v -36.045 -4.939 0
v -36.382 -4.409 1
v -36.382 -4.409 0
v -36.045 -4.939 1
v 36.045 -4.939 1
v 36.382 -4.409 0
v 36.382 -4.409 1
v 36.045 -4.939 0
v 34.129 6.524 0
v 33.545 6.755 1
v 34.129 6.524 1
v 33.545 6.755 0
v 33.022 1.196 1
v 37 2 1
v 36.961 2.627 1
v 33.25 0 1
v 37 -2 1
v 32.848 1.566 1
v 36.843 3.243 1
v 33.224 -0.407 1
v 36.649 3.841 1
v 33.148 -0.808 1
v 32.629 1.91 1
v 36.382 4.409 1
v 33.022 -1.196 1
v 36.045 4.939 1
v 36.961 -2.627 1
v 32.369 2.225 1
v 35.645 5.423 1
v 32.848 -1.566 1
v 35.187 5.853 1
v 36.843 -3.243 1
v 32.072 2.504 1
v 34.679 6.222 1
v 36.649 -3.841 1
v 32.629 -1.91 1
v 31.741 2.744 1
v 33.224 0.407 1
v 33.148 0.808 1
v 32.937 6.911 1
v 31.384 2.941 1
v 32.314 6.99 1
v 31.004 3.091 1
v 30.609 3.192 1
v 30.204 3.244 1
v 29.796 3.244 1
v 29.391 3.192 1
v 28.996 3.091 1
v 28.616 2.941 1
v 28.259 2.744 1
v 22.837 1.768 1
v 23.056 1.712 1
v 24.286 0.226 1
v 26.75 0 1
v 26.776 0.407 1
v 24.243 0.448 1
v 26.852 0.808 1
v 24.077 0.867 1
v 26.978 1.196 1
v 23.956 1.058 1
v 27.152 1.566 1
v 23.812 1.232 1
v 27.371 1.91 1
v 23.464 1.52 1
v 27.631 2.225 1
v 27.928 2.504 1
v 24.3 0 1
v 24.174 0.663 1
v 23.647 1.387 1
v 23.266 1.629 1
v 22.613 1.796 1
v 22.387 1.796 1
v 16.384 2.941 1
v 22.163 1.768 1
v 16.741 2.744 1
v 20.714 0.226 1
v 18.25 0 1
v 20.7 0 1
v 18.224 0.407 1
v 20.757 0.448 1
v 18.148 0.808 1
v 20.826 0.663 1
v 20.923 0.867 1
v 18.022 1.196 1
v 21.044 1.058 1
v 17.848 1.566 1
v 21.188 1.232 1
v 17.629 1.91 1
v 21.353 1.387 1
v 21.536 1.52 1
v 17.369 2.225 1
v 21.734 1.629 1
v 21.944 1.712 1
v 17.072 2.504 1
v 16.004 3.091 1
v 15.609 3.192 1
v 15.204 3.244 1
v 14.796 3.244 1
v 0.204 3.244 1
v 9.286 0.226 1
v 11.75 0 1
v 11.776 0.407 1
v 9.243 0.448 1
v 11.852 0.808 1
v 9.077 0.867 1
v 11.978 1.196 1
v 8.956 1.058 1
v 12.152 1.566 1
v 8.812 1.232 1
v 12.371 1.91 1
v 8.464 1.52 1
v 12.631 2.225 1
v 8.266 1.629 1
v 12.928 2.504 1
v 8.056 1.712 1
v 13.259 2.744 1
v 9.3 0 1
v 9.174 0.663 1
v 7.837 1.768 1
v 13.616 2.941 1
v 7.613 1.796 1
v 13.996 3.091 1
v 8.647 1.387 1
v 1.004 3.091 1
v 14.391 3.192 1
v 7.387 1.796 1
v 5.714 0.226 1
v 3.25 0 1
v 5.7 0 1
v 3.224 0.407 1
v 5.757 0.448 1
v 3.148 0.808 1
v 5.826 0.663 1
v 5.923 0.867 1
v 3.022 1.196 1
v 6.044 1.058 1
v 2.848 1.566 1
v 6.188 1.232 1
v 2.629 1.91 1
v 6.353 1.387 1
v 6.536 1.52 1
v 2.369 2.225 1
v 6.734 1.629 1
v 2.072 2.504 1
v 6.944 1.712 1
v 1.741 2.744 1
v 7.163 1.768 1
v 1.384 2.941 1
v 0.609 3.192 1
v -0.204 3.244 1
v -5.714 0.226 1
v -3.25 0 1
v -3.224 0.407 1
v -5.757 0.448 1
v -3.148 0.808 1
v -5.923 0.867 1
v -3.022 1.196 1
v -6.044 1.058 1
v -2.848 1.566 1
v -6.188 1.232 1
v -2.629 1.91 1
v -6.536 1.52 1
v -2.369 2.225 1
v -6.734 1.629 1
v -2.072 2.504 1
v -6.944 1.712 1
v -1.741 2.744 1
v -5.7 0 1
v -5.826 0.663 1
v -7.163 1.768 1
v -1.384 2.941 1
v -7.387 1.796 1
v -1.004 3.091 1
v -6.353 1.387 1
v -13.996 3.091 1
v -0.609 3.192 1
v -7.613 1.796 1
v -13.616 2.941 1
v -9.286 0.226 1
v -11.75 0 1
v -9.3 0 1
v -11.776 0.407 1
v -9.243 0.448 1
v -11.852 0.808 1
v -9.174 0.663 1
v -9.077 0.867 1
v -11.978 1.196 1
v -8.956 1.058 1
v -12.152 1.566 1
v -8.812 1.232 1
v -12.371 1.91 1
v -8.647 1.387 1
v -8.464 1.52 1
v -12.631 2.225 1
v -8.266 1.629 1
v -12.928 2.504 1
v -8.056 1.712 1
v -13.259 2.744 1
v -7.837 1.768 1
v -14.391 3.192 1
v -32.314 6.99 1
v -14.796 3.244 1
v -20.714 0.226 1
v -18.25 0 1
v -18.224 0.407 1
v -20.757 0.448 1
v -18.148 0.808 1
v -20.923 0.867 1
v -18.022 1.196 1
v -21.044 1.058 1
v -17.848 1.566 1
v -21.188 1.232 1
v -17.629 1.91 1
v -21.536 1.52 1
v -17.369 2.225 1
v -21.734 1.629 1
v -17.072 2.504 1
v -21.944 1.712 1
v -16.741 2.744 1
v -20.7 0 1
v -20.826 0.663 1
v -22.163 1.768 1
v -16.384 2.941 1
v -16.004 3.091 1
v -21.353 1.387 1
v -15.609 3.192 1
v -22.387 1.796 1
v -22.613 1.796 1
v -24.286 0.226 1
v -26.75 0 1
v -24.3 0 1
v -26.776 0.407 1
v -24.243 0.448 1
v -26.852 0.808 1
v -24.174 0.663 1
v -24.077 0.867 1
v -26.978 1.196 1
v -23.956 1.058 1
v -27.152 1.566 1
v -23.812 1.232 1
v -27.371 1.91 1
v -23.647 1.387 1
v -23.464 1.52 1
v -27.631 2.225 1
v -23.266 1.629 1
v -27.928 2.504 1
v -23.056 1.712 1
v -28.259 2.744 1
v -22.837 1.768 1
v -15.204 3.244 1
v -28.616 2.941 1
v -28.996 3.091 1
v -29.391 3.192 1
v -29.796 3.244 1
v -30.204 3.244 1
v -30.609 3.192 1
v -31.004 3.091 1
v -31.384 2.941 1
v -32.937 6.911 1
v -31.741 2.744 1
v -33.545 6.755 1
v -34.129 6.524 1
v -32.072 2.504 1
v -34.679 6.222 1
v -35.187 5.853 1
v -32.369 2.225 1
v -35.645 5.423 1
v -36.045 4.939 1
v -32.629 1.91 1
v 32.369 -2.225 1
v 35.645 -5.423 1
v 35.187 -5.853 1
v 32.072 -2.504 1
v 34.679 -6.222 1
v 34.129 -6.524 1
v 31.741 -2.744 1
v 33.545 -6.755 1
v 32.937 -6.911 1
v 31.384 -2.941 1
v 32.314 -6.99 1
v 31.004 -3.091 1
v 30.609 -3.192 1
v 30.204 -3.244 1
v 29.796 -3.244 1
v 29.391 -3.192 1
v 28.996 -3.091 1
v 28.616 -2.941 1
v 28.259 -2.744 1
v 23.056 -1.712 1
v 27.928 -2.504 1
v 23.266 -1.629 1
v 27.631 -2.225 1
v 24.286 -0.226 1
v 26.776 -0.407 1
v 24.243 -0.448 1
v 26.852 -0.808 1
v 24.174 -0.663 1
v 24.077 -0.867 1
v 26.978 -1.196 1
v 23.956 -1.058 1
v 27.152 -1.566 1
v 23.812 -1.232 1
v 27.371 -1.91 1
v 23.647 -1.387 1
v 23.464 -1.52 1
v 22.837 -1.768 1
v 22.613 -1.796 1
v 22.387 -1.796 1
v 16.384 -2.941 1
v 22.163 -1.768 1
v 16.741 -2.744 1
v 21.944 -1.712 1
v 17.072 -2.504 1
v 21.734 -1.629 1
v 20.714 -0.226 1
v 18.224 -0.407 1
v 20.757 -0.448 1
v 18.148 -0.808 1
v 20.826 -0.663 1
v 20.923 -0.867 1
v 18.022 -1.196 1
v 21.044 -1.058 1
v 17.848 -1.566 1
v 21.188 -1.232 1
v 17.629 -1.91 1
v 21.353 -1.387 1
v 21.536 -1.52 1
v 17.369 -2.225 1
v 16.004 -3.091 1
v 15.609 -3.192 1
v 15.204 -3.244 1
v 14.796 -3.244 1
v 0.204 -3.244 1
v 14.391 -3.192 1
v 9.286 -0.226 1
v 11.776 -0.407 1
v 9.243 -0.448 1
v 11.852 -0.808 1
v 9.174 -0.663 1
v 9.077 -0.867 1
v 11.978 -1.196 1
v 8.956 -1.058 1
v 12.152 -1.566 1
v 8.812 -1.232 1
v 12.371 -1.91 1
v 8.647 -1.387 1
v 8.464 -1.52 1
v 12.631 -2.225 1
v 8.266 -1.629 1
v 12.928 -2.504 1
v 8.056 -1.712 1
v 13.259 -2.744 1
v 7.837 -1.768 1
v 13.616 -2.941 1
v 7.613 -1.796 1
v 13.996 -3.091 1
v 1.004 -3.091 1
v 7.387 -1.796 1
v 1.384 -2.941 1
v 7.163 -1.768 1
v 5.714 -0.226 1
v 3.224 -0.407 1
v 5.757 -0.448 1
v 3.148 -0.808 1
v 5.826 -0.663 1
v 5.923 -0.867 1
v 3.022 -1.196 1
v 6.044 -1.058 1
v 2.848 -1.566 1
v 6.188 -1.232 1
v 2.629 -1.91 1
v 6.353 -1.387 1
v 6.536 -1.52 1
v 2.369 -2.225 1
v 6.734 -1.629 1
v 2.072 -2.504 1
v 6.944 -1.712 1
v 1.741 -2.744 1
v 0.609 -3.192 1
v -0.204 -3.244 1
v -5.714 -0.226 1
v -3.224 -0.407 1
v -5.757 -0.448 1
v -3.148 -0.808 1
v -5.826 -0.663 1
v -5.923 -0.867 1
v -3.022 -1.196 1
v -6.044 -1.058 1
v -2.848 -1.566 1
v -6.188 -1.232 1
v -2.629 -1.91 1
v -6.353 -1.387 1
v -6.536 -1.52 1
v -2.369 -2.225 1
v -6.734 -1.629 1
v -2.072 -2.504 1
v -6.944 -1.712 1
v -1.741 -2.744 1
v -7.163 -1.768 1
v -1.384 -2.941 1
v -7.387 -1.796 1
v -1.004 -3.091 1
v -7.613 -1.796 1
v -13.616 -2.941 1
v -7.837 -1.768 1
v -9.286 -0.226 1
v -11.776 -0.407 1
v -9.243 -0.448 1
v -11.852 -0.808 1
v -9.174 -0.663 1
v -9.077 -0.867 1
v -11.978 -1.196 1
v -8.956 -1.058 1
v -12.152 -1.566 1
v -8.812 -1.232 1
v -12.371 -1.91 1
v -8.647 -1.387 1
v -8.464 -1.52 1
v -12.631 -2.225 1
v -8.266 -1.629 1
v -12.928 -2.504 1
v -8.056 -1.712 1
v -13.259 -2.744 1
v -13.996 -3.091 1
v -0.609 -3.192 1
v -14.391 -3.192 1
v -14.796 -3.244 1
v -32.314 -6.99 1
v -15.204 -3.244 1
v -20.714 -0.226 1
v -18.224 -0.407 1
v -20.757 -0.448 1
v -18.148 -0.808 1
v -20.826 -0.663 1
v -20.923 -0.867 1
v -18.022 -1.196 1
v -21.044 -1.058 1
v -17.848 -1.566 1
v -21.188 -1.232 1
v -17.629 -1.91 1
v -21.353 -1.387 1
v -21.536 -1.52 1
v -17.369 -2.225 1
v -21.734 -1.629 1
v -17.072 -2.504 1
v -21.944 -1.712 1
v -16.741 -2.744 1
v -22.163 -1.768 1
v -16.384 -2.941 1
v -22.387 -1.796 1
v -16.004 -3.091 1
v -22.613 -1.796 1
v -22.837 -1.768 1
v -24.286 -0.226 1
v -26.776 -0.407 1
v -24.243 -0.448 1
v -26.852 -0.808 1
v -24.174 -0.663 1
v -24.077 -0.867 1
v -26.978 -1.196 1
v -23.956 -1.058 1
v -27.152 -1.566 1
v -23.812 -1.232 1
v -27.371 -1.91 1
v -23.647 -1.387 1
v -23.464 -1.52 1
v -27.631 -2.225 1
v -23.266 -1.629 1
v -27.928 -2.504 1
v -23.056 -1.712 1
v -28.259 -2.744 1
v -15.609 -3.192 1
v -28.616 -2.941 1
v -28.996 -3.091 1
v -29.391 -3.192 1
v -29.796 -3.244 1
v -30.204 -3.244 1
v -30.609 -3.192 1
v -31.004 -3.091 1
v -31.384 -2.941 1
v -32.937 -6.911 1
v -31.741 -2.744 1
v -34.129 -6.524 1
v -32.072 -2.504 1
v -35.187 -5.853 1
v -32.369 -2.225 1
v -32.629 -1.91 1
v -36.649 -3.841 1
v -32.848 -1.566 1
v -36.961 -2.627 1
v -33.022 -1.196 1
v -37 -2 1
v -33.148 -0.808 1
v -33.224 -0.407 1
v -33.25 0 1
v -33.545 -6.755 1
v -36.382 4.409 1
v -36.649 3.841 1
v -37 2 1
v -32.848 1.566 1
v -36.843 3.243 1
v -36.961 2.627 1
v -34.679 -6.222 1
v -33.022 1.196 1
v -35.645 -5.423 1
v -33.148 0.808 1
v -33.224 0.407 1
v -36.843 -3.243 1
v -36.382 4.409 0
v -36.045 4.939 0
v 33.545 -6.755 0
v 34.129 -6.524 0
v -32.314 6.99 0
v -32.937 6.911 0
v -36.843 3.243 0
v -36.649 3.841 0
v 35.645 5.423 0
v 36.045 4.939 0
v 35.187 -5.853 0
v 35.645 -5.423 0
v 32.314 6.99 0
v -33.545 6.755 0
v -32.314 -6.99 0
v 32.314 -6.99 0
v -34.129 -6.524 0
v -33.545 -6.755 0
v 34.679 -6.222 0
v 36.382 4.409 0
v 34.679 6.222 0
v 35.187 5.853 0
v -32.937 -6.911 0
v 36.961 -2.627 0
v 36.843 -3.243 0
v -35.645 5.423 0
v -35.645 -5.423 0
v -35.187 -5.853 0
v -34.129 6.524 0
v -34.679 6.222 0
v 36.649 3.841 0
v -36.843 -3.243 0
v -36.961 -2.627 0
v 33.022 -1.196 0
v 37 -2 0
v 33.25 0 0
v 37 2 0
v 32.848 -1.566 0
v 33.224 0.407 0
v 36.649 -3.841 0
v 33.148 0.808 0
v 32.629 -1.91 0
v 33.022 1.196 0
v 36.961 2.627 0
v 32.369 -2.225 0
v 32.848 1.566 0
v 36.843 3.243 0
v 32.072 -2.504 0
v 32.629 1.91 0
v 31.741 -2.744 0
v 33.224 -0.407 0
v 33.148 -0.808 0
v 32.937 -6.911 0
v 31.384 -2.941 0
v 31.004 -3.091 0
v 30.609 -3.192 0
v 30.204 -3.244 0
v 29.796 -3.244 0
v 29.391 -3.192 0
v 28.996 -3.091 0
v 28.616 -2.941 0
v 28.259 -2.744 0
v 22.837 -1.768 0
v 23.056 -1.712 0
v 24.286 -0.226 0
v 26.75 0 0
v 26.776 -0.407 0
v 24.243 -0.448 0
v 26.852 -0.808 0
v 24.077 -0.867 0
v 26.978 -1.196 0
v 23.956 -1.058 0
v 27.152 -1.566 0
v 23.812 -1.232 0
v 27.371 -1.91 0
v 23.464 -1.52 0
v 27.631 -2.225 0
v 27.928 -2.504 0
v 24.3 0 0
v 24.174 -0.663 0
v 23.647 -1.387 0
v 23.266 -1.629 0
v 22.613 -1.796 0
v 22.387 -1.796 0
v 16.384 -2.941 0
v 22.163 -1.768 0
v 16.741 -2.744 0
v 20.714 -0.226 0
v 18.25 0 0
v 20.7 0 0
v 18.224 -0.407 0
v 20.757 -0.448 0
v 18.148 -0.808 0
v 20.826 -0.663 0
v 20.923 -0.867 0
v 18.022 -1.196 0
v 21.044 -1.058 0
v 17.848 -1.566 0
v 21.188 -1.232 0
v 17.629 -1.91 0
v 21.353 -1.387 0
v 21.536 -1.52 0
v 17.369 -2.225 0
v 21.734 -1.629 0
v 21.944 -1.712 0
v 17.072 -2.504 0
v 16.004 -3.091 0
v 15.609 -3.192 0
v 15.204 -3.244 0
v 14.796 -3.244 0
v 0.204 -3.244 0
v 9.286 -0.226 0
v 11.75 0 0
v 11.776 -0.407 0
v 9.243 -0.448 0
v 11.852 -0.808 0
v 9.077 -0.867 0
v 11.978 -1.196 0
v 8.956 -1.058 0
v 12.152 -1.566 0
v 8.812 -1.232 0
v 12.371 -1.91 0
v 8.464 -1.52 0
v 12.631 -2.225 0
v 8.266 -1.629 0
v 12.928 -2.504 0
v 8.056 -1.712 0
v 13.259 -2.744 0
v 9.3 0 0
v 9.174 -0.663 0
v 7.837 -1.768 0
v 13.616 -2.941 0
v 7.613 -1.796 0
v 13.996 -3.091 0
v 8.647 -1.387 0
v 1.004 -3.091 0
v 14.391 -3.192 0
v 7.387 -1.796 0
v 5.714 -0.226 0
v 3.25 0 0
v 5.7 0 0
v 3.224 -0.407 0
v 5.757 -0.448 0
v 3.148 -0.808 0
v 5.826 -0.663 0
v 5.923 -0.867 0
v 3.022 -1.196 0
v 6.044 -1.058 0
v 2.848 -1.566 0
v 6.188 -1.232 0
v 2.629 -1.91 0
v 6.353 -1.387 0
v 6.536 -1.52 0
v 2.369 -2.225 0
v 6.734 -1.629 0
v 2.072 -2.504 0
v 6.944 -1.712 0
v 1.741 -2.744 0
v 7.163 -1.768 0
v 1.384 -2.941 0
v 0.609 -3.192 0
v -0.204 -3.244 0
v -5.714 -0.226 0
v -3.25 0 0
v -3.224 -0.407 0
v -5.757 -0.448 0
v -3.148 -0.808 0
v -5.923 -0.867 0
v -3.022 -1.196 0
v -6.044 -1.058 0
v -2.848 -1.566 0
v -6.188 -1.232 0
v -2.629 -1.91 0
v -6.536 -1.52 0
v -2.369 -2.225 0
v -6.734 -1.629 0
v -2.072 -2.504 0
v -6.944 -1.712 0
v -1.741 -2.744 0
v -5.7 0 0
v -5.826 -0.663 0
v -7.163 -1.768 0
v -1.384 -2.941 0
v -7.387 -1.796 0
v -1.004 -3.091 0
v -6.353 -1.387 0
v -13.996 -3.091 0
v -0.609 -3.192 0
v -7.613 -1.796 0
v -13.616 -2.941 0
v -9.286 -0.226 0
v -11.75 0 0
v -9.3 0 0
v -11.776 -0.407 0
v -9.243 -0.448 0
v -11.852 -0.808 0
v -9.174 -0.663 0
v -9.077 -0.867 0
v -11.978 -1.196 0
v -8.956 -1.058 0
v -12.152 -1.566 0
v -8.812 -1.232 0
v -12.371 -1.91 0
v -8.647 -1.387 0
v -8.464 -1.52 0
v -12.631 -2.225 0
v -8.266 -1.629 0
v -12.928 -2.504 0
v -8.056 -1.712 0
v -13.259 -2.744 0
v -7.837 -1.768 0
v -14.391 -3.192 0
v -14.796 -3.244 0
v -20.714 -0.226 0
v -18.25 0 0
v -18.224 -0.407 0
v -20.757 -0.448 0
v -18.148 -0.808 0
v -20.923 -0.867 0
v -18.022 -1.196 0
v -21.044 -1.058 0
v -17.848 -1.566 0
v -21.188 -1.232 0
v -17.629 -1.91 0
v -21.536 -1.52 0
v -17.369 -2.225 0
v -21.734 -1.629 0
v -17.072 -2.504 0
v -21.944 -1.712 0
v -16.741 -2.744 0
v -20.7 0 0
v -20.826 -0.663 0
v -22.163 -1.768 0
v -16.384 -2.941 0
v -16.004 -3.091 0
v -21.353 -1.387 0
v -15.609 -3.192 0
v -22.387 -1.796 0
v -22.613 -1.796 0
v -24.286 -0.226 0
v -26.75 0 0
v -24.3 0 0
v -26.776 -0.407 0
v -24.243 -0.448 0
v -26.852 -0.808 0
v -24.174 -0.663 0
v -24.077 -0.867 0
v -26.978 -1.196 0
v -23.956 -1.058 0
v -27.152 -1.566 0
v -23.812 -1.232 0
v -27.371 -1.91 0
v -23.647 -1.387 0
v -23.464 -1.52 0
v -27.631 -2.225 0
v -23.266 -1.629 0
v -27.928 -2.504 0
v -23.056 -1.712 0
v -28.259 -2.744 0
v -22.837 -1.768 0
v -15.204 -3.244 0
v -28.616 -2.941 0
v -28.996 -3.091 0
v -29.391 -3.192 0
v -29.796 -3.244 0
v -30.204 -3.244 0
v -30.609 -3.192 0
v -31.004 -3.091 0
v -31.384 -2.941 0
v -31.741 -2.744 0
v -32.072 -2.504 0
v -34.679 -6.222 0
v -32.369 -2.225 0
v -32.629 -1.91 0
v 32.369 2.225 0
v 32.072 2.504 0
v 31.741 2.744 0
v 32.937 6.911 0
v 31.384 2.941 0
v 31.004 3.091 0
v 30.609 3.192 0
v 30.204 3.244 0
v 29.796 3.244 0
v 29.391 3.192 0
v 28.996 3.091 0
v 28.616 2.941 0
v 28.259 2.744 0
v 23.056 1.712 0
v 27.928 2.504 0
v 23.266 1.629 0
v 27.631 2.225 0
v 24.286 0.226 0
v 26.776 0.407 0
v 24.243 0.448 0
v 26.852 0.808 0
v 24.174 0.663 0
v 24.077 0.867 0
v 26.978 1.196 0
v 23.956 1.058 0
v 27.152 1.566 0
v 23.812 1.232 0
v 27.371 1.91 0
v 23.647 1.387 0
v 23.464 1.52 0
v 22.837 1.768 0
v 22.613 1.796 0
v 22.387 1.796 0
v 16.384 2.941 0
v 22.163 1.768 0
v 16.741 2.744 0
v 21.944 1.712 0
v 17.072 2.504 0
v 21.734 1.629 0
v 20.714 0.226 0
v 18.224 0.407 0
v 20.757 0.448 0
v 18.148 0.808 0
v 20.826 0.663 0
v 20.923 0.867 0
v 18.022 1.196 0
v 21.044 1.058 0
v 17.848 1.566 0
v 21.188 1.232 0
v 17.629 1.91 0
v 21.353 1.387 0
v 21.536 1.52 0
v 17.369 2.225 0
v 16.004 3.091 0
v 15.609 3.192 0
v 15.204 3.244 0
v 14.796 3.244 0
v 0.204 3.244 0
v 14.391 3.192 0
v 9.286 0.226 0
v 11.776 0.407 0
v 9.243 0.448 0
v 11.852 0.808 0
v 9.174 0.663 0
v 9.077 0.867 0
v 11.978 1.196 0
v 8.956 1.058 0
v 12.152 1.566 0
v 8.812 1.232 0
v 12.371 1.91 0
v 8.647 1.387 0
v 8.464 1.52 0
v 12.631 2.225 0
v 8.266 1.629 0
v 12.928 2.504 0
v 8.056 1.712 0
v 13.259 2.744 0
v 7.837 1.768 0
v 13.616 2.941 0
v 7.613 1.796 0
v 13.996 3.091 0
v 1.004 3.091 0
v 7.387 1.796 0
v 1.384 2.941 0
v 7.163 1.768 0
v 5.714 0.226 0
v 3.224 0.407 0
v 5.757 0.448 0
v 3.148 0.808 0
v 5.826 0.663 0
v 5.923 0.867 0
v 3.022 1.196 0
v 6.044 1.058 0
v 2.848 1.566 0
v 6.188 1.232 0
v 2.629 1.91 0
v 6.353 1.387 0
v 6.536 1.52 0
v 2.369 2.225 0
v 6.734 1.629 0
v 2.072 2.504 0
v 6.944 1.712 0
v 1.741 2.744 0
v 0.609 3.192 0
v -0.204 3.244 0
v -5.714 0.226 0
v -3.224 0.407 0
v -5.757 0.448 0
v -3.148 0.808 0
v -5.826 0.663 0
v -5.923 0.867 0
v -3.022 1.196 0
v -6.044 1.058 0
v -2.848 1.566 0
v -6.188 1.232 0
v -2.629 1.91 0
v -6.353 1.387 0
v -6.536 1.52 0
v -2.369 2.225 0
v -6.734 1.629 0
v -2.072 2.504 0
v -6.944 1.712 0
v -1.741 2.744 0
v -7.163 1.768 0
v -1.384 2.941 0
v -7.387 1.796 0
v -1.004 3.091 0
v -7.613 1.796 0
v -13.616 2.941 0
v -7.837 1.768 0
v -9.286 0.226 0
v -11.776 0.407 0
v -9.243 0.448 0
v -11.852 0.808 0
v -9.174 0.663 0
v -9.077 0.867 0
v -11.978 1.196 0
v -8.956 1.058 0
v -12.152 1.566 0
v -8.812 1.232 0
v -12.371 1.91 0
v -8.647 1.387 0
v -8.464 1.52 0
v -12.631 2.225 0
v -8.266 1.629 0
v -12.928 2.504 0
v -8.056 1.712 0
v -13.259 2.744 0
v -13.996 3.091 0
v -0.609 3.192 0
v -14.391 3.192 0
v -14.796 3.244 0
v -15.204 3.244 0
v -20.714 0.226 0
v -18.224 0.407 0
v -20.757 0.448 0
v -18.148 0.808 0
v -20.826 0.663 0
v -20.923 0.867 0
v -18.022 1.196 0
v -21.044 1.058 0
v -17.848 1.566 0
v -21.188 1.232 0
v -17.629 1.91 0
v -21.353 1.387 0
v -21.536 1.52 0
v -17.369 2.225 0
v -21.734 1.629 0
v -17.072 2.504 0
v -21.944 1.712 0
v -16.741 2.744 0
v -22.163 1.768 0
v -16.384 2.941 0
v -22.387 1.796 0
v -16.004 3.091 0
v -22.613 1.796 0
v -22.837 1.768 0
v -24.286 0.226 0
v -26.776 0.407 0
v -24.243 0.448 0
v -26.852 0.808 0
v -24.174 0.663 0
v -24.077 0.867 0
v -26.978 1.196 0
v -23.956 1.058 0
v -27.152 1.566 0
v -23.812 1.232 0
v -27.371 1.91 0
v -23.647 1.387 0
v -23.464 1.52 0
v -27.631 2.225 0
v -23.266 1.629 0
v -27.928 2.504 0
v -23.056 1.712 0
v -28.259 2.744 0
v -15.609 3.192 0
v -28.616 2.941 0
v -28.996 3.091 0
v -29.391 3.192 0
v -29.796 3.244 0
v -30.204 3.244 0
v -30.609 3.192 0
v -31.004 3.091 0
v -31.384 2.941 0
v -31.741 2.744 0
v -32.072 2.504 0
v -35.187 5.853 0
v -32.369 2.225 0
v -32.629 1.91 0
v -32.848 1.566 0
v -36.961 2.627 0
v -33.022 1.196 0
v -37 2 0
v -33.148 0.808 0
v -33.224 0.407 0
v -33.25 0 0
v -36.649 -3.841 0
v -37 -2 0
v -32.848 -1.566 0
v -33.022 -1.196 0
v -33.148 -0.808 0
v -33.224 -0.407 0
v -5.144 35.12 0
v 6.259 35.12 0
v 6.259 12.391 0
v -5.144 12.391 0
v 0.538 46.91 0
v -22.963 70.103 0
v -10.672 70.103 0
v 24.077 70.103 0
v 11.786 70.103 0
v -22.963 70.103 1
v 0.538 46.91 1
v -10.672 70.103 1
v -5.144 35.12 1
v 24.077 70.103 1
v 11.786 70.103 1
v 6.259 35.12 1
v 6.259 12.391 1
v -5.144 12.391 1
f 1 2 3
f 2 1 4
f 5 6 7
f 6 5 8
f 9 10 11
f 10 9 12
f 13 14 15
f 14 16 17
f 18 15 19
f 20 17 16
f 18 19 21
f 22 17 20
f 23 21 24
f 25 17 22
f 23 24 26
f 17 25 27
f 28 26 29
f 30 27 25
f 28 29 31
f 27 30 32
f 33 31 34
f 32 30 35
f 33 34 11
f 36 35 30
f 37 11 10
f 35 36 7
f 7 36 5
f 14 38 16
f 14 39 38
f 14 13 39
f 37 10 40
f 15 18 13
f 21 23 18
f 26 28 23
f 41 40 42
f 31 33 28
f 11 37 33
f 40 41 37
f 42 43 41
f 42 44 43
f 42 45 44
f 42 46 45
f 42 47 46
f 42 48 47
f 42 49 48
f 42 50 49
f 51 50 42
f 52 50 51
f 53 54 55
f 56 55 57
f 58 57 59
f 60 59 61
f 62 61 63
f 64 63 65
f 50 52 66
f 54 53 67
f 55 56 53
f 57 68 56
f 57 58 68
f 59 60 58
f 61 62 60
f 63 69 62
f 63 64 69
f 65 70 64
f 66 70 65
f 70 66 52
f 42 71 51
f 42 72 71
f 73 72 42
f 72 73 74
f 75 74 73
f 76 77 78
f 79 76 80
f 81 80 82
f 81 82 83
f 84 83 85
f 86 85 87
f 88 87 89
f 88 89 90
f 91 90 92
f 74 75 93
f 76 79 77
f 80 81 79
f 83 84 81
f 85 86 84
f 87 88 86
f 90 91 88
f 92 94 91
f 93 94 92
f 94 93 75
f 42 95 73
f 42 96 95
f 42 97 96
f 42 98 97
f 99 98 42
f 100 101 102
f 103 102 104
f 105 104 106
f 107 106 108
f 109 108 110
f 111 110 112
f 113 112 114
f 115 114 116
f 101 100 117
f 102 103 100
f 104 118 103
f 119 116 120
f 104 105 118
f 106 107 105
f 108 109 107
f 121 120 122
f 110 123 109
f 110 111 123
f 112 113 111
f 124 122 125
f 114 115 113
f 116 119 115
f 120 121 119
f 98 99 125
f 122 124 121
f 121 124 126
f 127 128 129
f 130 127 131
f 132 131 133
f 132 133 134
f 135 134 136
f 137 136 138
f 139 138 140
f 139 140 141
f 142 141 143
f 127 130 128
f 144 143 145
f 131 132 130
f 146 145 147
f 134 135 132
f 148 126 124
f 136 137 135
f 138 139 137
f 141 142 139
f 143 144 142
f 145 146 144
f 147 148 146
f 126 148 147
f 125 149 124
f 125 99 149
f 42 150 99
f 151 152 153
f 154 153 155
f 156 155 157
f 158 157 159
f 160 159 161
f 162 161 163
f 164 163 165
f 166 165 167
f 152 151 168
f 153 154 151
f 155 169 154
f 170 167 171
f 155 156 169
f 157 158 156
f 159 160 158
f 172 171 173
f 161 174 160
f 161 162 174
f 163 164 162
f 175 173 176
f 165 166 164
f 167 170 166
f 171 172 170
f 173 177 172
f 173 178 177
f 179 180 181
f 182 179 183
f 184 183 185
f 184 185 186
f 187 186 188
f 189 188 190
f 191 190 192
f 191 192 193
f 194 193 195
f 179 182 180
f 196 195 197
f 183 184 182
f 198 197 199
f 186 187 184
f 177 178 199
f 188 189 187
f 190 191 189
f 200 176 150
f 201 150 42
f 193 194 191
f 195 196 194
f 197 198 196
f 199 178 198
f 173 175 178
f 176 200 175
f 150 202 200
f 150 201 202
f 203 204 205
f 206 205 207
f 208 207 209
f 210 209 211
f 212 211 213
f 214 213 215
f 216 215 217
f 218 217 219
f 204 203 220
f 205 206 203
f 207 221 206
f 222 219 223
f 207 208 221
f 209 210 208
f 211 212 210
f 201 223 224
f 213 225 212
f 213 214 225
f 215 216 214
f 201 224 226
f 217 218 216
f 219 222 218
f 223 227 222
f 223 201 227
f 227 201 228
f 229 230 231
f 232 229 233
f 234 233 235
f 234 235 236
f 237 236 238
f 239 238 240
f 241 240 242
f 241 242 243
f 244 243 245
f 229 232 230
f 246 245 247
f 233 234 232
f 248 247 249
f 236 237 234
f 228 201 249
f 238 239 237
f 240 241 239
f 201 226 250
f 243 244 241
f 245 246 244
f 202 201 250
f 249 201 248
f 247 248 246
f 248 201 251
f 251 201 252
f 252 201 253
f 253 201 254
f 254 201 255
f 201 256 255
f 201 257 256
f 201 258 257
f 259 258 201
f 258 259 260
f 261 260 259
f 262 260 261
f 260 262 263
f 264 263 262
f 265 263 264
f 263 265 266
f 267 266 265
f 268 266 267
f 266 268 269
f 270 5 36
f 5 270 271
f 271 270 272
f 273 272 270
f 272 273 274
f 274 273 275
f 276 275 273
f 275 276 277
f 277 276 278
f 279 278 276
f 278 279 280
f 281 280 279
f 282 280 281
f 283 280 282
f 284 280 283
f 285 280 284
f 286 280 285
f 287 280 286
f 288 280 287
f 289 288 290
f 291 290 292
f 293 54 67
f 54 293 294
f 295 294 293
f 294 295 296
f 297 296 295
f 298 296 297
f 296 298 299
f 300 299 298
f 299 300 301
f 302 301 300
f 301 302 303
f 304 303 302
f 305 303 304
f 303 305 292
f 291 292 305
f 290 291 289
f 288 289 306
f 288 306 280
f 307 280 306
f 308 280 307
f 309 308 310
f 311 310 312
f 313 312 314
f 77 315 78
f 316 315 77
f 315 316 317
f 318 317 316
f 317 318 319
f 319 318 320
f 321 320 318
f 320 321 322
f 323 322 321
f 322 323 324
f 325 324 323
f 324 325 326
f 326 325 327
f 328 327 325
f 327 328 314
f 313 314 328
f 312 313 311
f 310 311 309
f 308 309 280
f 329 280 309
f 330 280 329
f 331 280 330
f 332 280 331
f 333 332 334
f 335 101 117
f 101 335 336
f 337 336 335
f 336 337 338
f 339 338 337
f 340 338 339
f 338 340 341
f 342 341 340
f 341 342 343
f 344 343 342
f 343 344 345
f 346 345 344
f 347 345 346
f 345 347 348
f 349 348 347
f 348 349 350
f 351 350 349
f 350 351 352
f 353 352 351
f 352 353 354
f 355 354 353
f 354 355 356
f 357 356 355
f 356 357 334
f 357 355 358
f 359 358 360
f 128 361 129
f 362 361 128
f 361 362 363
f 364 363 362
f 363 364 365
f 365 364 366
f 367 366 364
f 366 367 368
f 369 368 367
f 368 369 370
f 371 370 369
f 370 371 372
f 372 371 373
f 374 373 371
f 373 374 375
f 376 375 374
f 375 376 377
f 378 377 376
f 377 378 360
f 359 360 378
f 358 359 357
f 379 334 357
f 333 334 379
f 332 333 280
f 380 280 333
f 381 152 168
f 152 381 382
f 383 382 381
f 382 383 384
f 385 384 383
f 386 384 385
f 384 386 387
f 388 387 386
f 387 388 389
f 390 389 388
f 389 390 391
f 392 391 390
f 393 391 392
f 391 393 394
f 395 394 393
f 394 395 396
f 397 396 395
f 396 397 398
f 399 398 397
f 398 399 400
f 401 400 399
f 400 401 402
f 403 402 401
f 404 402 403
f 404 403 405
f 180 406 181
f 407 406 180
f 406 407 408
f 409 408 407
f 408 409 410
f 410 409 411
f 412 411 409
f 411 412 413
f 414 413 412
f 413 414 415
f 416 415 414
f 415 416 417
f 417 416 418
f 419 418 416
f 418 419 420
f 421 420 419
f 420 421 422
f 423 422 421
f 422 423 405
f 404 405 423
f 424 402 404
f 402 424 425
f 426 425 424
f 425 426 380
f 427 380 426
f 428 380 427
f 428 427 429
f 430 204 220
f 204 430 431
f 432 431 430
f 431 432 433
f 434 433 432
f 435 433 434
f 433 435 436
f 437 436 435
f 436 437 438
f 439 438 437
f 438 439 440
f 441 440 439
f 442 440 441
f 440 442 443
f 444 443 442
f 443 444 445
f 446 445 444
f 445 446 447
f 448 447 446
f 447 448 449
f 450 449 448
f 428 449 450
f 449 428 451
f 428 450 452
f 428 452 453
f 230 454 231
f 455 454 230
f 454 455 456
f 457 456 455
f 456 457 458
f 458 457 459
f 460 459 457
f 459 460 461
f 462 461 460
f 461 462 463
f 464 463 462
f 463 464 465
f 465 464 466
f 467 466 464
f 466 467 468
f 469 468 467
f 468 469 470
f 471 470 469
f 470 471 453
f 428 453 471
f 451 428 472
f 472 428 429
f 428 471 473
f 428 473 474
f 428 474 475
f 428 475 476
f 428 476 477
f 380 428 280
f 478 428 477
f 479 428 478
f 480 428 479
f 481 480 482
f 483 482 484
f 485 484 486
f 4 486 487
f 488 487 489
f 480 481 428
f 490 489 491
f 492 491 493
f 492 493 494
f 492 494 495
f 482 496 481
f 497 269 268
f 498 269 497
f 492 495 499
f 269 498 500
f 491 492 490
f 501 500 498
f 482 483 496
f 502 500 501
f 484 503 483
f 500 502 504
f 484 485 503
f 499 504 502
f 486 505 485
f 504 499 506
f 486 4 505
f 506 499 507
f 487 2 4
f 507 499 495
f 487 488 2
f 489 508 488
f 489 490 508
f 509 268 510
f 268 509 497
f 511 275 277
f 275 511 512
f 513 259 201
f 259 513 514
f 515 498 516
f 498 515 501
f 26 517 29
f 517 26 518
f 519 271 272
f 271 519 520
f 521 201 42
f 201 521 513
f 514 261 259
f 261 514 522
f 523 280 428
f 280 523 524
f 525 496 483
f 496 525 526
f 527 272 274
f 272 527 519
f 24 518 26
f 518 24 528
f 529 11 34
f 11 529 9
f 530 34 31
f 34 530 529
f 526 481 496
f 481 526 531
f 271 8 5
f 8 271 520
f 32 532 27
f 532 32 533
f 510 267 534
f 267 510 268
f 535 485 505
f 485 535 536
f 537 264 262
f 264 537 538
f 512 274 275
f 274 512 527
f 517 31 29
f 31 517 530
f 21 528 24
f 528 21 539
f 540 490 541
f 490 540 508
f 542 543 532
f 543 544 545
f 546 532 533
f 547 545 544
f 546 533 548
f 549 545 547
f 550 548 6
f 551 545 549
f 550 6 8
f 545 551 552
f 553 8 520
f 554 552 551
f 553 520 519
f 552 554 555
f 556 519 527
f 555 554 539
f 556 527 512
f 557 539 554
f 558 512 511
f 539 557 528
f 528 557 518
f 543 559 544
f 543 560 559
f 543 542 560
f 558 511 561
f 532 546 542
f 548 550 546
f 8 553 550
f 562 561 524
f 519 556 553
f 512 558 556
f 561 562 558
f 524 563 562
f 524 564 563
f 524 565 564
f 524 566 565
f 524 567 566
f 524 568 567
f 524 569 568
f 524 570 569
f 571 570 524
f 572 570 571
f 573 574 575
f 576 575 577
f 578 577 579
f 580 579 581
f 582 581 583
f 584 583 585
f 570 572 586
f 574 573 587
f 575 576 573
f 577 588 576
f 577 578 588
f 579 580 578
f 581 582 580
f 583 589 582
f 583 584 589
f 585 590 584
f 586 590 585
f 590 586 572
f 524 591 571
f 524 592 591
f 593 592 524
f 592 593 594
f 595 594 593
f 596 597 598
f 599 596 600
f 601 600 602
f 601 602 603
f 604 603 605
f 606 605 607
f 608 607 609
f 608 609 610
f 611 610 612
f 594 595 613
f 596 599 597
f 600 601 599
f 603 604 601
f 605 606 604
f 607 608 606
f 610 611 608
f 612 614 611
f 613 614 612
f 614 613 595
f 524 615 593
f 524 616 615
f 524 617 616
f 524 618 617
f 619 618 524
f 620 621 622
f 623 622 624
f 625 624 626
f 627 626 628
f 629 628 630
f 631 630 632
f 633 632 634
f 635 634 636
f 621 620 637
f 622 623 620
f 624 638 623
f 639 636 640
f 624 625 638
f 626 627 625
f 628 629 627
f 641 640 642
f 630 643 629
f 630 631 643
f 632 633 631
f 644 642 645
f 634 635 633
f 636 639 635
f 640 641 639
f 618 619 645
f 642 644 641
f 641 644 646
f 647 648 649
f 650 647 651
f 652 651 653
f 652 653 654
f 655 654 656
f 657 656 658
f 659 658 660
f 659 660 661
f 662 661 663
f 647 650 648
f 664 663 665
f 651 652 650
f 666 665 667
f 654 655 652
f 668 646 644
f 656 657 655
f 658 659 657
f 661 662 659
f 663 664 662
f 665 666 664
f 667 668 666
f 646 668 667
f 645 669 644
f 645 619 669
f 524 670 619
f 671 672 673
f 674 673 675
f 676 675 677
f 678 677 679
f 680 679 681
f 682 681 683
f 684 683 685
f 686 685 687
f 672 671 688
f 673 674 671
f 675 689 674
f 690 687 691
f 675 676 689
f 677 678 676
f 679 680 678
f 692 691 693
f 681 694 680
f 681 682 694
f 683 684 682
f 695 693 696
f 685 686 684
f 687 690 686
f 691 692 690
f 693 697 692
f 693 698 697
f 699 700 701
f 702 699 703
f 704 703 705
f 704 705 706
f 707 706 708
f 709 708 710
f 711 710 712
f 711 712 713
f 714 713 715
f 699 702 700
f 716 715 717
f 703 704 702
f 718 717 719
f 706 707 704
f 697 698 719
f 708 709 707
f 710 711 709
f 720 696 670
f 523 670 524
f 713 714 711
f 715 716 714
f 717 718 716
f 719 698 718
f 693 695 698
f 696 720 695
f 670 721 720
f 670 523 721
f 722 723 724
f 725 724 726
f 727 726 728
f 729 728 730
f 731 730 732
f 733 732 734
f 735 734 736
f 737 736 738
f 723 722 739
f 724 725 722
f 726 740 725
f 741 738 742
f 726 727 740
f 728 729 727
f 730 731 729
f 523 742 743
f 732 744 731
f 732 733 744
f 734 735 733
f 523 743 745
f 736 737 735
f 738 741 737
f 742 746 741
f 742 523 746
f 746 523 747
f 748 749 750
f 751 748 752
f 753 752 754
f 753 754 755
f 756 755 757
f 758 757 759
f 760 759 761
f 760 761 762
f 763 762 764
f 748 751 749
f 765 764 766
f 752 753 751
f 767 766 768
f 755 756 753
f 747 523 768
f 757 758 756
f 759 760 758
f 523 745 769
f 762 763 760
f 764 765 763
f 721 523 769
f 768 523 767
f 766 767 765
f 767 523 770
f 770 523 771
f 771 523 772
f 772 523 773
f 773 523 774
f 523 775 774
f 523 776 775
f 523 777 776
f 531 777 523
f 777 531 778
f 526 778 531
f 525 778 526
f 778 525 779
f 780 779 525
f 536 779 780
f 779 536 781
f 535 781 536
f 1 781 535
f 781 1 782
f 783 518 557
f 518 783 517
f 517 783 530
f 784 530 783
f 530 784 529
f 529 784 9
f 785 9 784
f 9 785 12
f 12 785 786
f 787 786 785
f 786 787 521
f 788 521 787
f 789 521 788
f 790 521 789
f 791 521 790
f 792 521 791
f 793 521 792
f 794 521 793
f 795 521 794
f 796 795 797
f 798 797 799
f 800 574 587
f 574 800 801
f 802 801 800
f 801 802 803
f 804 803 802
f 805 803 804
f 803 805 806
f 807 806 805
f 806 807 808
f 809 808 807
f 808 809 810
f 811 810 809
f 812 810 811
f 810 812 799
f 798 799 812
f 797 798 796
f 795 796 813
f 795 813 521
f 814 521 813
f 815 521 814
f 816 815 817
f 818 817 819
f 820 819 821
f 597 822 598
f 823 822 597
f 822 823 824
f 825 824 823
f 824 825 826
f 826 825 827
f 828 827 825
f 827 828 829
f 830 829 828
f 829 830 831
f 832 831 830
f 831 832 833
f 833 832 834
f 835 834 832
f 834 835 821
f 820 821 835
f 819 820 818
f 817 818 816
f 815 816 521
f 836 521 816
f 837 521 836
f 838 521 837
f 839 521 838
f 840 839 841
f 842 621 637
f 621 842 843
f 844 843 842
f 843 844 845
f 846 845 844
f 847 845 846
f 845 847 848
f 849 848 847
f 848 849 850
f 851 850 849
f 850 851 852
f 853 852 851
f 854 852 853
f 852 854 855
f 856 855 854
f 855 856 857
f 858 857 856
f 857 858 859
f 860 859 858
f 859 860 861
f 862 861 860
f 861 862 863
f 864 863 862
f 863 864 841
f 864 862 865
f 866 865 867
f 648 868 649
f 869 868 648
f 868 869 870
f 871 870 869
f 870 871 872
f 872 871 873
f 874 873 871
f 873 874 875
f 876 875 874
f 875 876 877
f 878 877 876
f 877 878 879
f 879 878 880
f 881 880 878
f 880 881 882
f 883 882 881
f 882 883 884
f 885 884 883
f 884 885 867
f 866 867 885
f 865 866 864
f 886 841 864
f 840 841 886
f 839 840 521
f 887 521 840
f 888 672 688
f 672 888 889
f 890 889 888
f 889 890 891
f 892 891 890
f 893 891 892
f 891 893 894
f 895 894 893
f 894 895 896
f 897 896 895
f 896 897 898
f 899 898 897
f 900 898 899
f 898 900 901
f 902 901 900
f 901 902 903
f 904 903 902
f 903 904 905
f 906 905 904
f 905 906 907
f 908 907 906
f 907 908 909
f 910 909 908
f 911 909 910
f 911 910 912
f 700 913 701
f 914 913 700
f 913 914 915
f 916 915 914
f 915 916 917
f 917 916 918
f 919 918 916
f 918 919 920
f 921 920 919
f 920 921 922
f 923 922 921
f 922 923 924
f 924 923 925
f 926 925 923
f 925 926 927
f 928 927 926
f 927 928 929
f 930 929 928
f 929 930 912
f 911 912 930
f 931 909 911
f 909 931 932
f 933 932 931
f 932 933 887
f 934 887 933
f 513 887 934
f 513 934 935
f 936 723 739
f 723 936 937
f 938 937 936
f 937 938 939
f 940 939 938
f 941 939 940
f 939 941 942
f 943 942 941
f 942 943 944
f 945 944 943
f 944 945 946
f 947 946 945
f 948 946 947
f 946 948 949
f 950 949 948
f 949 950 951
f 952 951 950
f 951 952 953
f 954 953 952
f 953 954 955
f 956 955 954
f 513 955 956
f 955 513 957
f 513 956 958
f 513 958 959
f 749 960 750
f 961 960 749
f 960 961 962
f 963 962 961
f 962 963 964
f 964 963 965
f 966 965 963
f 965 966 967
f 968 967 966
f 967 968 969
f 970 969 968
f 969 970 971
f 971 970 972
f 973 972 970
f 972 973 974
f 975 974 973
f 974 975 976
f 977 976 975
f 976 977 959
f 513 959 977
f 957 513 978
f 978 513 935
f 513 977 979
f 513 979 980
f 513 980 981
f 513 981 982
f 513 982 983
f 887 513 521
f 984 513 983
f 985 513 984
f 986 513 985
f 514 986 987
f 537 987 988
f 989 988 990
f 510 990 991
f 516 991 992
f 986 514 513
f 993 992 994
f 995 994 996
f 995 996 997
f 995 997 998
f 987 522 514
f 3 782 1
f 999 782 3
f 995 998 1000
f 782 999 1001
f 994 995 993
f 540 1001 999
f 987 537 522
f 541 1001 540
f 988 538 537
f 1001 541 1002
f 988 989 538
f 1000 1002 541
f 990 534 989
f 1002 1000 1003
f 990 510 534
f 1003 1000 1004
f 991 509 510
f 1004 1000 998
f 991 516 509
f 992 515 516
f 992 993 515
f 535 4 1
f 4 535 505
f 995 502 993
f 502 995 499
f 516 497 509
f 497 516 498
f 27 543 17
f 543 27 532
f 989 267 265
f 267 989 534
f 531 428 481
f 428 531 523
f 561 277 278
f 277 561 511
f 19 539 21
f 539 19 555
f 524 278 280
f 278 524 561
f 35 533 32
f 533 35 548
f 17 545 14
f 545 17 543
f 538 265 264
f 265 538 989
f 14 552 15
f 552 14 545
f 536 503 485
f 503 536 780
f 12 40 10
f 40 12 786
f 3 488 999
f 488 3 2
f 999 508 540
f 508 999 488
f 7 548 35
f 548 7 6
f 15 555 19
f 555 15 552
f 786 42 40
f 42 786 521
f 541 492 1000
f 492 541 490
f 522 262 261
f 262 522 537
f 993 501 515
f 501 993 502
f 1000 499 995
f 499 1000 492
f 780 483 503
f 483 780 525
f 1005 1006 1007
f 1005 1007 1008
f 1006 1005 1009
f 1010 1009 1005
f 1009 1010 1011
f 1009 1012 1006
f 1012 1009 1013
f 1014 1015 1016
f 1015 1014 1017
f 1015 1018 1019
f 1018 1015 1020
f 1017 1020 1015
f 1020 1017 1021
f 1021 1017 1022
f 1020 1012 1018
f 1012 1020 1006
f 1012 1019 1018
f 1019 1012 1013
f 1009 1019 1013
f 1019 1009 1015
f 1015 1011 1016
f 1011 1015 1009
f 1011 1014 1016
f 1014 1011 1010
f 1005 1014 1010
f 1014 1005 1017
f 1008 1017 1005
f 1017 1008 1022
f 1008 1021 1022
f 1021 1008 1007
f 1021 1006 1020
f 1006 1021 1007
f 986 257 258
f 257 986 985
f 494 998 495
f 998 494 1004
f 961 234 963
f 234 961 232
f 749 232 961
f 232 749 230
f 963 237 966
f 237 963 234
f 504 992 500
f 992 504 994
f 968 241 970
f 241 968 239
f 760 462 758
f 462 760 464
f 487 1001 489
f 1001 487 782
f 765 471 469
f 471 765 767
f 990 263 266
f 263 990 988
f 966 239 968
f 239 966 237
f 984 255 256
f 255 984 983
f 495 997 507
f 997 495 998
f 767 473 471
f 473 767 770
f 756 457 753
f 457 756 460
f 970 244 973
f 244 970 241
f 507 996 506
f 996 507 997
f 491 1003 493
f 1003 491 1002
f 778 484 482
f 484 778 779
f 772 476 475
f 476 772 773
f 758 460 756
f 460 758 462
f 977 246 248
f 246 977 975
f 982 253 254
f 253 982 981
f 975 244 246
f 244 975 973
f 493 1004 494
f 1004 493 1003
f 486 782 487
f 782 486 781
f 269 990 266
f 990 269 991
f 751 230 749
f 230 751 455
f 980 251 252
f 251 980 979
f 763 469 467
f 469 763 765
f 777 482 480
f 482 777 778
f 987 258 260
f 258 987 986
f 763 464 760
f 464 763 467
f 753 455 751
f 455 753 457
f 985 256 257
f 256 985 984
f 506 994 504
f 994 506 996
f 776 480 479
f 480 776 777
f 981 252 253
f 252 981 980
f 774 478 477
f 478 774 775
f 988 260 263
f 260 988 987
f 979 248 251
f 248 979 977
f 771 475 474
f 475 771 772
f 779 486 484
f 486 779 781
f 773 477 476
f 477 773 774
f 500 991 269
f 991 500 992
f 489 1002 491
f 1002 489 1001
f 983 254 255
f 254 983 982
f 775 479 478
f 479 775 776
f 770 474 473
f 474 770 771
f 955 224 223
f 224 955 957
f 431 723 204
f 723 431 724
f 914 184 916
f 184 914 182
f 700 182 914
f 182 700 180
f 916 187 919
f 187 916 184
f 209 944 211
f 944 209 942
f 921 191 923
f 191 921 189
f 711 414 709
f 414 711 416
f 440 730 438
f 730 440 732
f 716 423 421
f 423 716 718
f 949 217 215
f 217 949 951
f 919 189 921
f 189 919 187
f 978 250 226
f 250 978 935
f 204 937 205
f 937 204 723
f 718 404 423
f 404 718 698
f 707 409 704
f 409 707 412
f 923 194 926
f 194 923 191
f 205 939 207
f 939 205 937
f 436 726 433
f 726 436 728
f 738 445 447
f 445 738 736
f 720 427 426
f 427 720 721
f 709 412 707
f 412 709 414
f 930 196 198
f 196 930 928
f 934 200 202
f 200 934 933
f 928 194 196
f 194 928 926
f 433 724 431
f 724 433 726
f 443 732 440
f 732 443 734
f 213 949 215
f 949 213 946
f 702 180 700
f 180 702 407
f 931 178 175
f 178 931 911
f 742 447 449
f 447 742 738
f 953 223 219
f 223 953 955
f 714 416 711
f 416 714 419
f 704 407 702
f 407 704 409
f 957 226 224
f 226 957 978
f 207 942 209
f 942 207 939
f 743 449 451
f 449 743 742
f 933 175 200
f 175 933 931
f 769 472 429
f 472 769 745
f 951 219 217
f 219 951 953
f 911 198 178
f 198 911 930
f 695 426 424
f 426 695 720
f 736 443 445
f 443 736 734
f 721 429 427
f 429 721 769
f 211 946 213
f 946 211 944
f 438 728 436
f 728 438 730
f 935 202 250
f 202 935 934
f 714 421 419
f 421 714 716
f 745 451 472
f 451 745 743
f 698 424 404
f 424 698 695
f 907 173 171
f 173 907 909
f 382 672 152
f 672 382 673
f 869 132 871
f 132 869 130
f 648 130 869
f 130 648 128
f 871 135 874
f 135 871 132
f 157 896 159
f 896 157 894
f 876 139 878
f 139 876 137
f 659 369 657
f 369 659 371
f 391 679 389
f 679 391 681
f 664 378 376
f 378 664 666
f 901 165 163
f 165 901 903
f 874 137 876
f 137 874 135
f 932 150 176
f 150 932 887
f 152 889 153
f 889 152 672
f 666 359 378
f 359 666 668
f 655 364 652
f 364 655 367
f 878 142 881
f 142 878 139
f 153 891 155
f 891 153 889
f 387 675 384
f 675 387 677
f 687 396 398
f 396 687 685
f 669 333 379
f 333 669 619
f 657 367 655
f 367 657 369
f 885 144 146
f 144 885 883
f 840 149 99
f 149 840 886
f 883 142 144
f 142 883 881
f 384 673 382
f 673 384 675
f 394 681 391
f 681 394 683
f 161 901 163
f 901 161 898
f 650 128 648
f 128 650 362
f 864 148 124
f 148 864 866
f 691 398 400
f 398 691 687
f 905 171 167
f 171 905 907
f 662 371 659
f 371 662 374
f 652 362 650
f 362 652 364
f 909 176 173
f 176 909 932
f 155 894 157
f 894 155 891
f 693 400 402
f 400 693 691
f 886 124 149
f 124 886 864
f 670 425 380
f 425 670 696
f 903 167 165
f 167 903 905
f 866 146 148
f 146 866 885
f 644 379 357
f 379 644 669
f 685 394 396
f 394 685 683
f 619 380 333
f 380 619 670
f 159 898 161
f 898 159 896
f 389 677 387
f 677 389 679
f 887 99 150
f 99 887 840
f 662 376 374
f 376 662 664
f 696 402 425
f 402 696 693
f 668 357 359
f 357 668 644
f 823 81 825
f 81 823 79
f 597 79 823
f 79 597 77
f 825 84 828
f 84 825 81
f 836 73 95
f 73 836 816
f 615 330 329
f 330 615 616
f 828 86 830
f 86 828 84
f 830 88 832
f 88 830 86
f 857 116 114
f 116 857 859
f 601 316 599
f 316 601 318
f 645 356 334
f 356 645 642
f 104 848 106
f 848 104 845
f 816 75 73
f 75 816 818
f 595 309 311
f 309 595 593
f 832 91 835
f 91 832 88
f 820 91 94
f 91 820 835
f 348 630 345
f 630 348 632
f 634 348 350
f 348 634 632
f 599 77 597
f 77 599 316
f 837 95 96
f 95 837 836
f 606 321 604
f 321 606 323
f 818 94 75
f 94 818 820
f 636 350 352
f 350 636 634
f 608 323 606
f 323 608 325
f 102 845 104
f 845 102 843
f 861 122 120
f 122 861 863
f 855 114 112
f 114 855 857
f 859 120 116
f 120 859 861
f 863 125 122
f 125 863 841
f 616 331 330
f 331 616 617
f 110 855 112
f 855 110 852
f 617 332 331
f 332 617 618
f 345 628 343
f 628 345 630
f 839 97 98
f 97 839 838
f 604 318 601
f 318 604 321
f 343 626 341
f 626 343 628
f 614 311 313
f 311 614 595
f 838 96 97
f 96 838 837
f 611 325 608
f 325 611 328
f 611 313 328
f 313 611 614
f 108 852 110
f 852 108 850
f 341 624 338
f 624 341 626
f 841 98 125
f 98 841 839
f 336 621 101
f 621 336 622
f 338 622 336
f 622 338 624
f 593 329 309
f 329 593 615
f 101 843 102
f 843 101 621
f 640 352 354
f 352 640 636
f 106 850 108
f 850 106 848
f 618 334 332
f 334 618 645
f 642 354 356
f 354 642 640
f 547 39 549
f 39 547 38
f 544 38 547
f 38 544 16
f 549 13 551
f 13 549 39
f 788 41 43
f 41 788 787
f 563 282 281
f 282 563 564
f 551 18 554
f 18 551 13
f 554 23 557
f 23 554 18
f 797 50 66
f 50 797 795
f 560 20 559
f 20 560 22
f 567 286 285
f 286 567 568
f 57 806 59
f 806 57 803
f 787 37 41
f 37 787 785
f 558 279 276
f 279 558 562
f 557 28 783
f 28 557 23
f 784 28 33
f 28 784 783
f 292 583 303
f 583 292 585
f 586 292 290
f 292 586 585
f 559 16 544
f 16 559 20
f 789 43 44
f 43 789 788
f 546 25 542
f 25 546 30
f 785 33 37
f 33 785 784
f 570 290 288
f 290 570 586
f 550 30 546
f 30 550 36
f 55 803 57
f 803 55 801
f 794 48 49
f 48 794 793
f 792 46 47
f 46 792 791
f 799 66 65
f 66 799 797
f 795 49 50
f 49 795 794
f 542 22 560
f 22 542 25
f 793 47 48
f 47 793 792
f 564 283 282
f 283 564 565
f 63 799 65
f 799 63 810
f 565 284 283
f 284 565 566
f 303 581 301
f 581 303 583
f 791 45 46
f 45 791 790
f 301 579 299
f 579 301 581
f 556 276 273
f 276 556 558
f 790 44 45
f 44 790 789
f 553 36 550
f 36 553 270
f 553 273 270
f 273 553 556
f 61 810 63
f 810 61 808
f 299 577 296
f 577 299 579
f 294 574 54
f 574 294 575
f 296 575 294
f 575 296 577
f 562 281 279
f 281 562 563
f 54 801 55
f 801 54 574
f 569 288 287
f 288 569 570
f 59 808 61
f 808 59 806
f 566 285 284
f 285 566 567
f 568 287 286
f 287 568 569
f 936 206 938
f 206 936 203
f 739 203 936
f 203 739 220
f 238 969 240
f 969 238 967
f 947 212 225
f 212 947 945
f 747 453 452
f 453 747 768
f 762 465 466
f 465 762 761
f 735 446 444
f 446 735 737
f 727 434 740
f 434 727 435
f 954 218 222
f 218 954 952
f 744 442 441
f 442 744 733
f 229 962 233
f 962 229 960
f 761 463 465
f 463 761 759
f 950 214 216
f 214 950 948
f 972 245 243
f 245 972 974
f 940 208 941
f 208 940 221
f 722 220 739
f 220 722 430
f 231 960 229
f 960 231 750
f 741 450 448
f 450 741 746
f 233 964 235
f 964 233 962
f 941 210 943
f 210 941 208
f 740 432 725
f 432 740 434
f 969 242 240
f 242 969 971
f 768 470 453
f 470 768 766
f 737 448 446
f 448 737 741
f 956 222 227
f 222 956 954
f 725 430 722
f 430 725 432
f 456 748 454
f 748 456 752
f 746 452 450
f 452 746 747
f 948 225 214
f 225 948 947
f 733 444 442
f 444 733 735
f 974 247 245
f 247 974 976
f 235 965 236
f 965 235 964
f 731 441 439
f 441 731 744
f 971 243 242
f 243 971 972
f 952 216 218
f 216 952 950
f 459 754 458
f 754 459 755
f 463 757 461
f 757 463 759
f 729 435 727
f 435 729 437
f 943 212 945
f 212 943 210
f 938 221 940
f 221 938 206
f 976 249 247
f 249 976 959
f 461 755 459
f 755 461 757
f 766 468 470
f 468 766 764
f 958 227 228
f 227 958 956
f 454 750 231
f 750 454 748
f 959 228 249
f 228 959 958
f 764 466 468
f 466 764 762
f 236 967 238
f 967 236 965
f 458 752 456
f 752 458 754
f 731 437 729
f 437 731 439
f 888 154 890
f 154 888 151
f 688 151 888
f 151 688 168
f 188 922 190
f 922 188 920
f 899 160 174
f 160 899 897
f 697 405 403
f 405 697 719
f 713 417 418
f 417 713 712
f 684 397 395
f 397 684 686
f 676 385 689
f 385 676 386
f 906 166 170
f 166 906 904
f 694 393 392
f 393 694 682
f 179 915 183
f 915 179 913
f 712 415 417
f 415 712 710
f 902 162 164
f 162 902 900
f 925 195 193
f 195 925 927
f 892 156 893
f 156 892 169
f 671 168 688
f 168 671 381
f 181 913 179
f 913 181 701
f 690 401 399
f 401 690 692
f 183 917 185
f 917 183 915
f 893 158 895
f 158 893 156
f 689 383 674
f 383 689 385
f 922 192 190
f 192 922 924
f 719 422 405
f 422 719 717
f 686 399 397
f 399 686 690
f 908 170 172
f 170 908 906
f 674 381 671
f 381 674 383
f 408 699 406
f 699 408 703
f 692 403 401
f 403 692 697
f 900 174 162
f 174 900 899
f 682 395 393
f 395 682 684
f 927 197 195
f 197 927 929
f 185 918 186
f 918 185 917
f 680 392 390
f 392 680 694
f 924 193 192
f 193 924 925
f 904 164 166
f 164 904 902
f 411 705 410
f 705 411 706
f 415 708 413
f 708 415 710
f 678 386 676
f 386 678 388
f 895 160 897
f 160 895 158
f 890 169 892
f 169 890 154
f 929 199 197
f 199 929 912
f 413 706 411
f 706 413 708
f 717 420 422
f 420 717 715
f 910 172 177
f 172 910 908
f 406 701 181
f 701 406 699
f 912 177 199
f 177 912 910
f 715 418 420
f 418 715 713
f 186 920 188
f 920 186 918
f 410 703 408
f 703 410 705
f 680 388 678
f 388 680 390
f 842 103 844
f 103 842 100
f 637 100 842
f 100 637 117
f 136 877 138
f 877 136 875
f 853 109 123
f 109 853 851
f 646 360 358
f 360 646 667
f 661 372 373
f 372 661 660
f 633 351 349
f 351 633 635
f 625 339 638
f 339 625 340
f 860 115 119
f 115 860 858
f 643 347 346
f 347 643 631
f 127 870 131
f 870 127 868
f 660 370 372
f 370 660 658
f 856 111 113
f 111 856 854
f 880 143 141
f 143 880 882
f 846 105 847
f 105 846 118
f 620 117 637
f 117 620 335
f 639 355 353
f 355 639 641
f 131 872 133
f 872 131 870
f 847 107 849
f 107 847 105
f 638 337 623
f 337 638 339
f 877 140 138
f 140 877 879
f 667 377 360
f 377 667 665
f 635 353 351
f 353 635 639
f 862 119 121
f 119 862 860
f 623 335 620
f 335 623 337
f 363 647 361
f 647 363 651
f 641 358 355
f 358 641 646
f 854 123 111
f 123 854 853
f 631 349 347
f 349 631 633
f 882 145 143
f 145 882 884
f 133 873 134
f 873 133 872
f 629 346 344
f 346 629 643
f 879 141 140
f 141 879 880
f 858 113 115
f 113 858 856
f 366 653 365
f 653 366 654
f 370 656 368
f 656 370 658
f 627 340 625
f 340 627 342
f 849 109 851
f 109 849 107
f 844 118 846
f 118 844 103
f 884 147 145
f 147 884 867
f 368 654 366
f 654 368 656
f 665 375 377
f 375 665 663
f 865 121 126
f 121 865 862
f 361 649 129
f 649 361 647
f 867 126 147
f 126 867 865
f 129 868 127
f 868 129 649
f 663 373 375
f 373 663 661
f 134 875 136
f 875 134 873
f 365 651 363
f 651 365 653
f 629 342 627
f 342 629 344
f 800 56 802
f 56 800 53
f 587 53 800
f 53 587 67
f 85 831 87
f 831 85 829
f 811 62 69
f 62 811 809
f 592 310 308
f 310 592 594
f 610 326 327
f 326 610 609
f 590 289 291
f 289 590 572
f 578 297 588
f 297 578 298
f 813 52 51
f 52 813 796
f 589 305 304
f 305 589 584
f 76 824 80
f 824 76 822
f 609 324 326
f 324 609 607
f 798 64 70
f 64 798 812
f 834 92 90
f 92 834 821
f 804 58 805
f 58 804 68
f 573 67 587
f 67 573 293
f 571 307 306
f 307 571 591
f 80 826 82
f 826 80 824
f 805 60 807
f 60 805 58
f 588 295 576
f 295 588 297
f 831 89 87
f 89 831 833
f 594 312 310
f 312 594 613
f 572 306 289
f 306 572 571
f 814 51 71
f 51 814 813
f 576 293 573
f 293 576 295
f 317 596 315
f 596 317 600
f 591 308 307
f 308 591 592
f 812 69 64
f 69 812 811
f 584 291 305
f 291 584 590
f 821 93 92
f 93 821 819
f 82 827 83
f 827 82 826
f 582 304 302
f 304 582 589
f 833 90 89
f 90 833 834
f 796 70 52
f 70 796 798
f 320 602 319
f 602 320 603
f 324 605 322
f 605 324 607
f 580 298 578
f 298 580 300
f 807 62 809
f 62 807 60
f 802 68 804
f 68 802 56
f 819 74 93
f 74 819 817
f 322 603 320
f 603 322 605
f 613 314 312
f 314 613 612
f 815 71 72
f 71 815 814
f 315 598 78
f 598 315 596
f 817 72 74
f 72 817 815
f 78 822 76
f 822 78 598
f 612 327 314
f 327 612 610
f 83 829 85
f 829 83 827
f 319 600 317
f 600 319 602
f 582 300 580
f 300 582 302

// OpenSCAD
$fn = 50;


difference() {
	union() {
		hull() {
			translate(v = [-32.0000000000, 2.0000000000, 0]) {
				cylinder(h = 1, r = 5);
			}
			translate(v = [32.0000000000, 2.0000000000, 0]) {
				cylinder(h = 1, r = 5);
			}
			translate(v = [-32.0000000000, -2.0000000000, 0]) {
				cylinder(h = 1, r = 5);
			}
			translate(v = [32.0000000000, -2.0000000000, 0]) {
				cylinder(h = 1, r = 5);
			}
		}
		translate(v = [0, 68.7500000000, 0]) {
			linear_extrude(height = 1) {
				text(font = "DejaVu Sans Mono:style=Bold", halign = "center", size = 57.0000000000, text = "Y", valign = "top");
			}
		}
	}
	union() {
		translate(v = [-30.0000000000, 0.0000000000, 0]) {
			translate(v = [0, 0, -100]) {
				cylinder(h = 200, r = 3.2500000000);
			}
		}
		translate(v = [-15.0000000000, 0.0000000000, 0]) {
			translate(v = [0, 0, -100]) {
				cylinder(h = 200, r = 3.2500000000);
			}
		}
		translate(v = [0, 0, -100]) {
			cylinder(h = 200, r = 3.2500000000);
		}
		translate(v = [15.0000000000, 0.0000000000, 0]) {
			translate(v = [0, 0, -100]) {
				cylinder(h = 200, r = 3.2500000000);
			}
		}
		translate(v = [30.0000000000, 0.0000000000, 0]) {
			translate(v = [0, 0, -100]) {
				cylinder(h = 200, r = 3.2500000000);
			}
		}
		translate(v = [-30.0000000000, 0.0000000000, 0]) {
			translate(v = [0, 0, -100]) {
				cylinder(h = 200, r = 1.8000000000);
			}
		}
		translate(v = [-22.5000000000, 0.0000000000, 0]) {
			translate(v = [0, 0, -100]) {
				cylinder(h = 200, r = 1.8000000000);
			}
		}
		translate(v = [-15.0000000000, 0.0000000000, 0]) {
			translate(v = [0, 0, -100]) {
				cylinder(h = 200, r = 1.8000000000);
			}
		}
		translate(v = [-7.5000000000, 0.0000000000, 0]) {
			translate(v = [0, 0, -100]) {
				cylinder(h = 200, r = 1.8000000000);
			}
		}
		translate(v = [0, 0, -100]) {
			cylinder(h = 200, r = 1.8000000000);
		}
		translate(v = [7.5000000000, 0.0000000000, 0]) {
			translate(v = [0, 0, -100]) {
				cylinder(h = 200, r = 1.8000000000);
			}
		}
		translate(v = [15.0000000000, 0.0000000000, 0]) {
			translate(v = [0, 0, -100]) {
				cylinder(h = 200, r = 1.8000000000);
			}
		}
		translate(v = [22.5000000000, 0.0000000000, 0]) {
			translate(v = [0, 0, -100]) {
				cylinder(h = 200, r = 1.8000000000);
			}
		}
		translate(v = [30.0000000000, 0.0000000000, 0]) {
			translate(v = [0, 0, -100]) {
				cylinder(h = 200, r = 1.8000000000);
			}
		}
	}
}
